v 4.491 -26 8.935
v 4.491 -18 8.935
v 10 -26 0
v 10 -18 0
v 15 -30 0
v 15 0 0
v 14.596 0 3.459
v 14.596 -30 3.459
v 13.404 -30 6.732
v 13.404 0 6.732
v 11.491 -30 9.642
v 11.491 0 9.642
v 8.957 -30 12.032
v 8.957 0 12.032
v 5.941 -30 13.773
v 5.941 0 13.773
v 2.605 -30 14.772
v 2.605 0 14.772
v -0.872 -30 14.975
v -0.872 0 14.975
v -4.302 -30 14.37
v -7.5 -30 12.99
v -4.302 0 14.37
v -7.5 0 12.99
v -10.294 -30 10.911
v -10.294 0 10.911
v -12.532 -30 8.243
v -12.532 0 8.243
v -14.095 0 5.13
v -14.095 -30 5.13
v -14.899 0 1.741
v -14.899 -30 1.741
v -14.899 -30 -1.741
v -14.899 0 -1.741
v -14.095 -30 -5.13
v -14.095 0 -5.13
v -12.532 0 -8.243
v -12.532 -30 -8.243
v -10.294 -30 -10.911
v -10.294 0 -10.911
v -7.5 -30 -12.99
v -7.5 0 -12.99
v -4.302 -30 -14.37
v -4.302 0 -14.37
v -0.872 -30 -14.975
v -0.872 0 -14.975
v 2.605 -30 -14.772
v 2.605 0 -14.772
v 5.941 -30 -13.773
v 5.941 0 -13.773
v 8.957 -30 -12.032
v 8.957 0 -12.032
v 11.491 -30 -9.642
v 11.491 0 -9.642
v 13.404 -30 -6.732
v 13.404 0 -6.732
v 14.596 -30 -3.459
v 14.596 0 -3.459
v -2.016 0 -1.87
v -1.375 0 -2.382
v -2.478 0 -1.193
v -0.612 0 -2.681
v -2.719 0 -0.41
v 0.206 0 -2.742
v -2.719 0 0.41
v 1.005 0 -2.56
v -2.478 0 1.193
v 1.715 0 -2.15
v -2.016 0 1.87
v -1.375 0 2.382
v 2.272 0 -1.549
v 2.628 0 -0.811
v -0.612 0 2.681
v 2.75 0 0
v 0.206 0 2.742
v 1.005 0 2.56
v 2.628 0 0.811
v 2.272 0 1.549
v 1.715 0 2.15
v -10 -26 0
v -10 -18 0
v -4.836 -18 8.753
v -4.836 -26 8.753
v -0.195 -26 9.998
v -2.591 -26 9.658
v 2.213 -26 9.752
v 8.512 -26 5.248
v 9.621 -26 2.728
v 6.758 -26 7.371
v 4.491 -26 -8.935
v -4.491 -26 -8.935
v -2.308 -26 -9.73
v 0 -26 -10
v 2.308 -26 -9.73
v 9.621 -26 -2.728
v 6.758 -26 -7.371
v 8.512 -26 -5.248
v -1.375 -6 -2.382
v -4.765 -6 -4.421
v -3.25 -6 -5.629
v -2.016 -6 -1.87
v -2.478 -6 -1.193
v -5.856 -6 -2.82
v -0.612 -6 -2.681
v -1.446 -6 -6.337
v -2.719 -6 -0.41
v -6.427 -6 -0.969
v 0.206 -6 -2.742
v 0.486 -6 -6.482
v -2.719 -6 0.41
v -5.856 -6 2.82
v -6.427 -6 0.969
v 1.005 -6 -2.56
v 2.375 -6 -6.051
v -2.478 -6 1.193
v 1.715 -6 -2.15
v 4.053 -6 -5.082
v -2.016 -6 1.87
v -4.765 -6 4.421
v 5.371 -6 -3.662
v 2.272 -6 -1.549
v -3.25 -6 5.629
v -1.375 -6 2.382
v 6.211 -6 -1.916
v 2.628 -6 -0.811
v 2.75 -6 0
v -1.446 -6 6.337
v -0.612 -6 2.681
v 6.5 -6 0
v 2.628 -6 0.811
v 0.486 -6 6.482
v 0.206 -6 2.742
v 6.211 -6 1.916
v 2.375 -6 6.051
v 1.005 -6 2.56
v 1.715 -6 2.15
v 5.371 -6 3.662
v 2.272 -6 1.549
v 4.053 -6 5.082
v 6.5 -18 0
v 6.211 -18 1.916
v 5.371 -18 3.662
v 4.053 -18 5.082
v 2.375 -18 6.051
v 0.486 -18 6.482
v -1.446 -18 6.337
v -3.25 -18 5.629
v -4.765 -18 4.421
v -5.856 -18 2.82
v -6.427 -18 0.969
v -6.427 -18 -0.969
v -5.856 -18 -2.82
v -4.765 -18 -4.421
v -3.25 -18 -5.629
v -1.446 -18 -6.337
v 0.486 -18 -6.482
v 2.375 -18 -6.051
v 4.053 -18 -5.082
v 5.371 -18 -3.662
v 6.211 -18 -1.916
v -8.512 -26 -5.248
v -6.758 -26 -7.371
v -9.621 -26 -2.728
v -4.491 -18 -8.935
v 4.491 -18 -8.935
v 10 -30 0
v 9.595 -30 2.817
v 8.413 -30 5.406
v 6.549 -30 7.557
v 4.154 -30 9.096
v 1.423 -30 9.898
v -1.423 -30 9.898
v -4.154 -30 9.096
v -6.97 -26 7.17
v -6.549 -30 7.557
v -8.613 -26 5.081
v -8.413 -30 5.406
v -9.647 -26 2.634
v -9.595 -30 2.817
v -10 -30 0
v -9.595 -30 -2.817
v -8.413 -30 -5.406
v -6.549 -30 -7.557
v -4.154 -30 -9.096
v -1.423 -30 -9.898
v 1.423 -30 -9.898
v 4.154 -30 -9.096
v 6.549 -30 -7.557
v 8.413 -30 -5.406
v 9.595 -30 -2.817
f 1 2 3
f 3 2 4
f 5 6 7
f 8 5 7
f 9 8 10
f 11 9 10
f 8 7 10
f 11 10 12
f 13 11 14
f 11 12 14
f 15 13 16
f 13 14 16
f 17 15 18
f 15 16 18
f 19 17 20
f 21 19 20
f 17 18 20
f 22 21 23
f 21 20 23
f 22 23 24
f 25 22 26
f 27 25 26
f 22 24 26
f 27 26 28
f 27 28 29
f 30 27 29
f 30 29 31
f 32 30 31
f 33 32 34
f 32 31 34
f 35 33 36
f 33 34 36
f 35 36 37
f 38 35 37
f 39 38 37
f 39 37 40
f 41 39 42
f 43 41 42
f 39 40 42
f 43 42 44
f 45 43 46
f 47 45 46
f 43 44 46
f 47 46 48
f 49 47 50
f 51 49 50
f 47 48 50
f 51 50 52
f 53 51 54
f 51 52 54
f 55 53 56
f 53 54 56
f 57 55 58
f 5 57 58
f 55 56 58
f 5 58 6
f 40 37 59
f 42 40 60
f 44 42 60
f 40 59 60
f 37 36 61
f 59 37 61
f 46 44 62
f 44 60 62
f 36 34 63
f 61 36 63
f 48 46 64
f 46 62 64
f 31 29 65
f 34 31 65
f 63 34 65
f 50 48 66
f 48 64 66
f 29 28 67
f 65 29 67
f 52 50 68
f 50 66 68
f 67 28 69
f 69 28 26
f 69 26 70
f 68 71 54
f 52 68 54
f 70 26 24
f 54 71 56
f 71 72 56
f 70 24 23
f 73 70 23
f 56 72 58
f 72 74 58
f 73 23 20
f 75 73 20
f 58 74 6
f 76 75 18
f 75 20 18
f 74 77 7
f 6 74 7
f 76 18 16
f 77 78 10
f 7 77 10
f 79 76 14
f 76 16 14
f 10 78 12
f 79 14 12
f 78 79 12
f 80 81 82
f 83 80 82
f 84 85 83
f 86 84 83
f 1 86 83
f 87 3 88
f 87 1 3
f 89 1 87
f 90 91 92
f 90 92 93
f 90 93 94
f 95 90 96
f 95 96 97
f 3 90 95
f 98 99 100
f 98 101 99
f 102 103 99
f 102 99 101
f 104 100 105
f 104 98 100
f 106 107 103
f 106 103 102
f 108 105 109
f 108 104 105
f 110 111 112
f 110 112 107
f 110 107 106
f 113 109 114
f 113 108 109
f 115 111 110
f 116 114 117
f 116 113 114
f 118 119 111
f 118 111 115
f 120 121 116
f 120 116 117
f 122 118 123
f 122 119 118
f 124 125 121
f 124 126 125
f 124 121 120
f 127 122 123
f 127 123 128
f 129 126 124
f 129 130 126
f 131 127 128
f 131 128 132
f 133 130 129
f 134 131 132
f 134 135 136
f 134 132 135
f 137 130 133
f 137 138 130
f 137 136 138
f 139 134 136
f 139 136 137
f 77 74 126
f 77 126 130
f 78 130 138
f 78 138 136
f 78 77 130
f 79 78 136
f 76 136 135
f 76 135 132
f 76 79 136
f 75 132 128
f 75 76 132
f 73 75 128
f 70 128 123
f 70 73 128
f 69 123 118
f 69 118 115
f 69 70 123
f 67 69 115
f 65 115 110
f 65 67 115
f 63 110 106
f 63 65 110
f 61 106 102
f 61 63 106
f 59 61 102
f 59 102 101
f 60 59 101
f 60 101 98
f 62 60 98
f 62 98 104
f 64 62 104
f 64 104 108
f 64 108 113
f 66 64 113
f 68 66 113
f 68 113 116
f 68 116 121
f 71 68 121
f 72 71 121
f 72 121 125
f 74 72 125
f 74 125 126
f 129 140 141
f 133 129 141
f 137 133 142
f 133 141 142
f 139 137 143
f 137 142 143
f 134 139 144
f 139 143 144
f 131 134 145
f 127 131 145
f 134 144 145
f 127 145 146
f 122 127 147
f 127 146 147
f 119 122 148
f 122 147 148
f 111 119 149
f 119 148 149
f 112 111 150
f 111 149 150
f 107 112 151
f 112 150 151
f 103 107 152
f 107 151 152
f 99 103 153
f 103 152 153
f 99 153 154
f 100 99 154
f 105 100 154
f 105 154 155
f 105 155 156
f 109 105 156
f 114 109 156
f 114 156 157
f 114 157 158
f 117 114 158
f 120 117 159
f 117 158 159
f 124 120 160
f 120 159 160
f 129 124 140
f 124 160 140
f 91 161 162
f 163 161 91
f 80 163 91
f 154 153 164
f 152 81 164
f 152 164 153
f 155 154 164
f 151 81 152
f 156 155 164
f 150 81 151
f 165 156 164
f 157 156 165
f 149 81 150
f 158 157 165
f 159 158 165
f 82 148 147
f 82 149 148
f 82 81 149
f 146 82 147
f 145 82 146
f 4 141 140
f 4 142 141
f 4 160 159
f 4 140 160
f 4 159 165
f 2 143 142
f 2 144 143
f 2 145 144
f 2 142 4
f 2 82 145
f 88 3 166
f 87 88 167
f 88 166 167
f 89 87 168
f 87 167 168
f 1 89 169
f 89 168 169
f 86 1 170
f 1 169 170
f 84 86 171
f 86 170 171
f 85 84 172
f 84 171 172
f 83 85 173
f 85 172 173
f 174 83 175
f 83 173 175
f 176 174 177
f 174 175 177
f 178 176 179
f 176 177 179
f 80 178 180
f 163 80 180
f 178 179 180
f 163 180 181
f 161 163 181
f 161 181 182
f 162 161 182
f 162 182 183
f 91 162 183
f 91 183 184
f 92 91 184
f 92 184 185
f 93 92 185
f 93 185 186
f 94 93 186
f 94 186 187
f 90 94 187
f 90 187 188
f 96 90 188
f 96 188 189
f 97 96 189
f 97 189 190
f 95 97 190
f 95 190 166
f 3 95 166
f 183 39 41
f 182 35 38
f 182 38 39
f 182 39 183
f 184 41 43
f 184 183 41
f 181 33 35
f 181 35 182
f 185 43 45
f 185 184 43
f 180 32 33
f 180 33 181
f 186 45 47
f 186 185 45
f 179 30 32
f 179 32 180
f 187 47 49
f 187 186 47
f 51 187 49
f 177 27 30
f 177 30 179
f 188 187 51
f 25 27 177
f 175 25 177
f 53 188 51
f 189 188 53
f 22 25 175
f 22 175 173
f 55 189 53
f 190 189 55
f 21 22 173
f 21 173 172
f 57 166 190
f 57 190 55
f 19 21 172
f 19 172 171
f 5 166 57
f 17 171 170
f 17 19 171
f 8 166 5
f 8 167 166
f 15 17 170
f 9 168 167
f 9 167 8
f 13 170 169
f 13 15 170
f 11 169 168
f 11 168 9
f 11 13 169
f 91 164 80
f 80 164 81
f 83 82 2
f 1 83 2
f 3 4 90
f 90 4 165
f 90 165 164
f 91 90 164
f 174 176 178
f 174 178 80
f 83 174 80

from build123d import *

# Parameters (mm, degrees)
F0_R     = 15
F0_R_2   = 9.25
F0_R_3   = 4.5
F0_R_4   = 2.75
F1_DEPTH = 30
F2_R     = 10
F2_R_2   = 2.75
F3_DEPTH = 12
F4_R     = 6.5
F4_R_2   = 2.75
F5_DEPTH = 12
F7_DEPTH = 8


with BuildPart() as f1:
    # F0 (on Front) → F1 (new body)
    with BuildSketch(Plane.XZ):
        Circle(F0_R)
        Circle(F0_R_2, mode=Mode.SUBTRACT)
        Circle(F0_R_2)
        Circle(F0_R_3, mode=Mode.SUBTRACT)
        Circle(F0_R_3)
        Circle(F0_R_4, mode=Mode.SUBTRACT)
    extrude(amount=F1_DEPTH)

    # F2 (on face) → F3 (cut)
    with BuildSketch(Plane.XZ.offset(30)):
        Circle(F2_R)
        Circle(F2_R_2, mode=Mode.SUBTRACT)
    extrude(amount=-F3_DEPTH, mode=Mode.SUBTRACT)

    # F4 (on face) → F5 (cut)
    with BuildSketch(Plane.XZ.offset(18)):
        Circle(F4_R)
        Circle(F4_R_2, mode=Mode.SUBTRACT)
    extrude(amount=-F5_DEPTH, mode=Mode.SUBTRACT)

    # F6 (on face) → F7 (join)
    with BuildSketch(Plane.XZ.offset(18)):
        with BuildLine():
            ThreePointArc((4.4908489249, 8.9348909301), (-0.195068874, 9.9980972257), (-4.8359487164, 8.7529195137))
            Line((-4.8359487164, 8.7529195137), (4.4908489249, 8.9348909301))
        make_face()
        with BuildLine():
            ThreePointArc((10, 0), (8.5120059107, 5.2484050316), (4.4908489249, 8.9348909301))
            Line((4.4908489249, 8.9348909301), (10, 0))
        make_face()
        with BuildLine():
            ThreePointArc((4.4908489249, -8.9348909301), (8.5120059107, -5.2484050316), (10, 0))
            Line((10, 0), (4.4908489249, -8.9348909301))
        make_face()
        with BuildLine():
            Line((4.4908489249, -8.9348909301), (-4.4908489249, -8.9348909301))
            ThreePointArc((-4.4908489249, -8.9348909301), (0, -10), (4.4908489249, -8.9348909301))
        make_face()
        with BuildLine():
            Line((-4.4908489249, -8.9348909301), (-10, 0))
            ThreePointArc((-10, 0), (-8.5120059107, -5.2484050316), (-4.4908489249, -8.9348909301))
        make_face()
        with BuildLine():
            Line((-10, 0), (-4.8359487164, 8.7529195137))
            ThreePointArc((-4.8359487164, 8.7529195137), (-8.6127663141, 5.0813636377), (-10, 0))
        make_face()
    extrude(amount=F7_DEPTH)


solid = f1.part
